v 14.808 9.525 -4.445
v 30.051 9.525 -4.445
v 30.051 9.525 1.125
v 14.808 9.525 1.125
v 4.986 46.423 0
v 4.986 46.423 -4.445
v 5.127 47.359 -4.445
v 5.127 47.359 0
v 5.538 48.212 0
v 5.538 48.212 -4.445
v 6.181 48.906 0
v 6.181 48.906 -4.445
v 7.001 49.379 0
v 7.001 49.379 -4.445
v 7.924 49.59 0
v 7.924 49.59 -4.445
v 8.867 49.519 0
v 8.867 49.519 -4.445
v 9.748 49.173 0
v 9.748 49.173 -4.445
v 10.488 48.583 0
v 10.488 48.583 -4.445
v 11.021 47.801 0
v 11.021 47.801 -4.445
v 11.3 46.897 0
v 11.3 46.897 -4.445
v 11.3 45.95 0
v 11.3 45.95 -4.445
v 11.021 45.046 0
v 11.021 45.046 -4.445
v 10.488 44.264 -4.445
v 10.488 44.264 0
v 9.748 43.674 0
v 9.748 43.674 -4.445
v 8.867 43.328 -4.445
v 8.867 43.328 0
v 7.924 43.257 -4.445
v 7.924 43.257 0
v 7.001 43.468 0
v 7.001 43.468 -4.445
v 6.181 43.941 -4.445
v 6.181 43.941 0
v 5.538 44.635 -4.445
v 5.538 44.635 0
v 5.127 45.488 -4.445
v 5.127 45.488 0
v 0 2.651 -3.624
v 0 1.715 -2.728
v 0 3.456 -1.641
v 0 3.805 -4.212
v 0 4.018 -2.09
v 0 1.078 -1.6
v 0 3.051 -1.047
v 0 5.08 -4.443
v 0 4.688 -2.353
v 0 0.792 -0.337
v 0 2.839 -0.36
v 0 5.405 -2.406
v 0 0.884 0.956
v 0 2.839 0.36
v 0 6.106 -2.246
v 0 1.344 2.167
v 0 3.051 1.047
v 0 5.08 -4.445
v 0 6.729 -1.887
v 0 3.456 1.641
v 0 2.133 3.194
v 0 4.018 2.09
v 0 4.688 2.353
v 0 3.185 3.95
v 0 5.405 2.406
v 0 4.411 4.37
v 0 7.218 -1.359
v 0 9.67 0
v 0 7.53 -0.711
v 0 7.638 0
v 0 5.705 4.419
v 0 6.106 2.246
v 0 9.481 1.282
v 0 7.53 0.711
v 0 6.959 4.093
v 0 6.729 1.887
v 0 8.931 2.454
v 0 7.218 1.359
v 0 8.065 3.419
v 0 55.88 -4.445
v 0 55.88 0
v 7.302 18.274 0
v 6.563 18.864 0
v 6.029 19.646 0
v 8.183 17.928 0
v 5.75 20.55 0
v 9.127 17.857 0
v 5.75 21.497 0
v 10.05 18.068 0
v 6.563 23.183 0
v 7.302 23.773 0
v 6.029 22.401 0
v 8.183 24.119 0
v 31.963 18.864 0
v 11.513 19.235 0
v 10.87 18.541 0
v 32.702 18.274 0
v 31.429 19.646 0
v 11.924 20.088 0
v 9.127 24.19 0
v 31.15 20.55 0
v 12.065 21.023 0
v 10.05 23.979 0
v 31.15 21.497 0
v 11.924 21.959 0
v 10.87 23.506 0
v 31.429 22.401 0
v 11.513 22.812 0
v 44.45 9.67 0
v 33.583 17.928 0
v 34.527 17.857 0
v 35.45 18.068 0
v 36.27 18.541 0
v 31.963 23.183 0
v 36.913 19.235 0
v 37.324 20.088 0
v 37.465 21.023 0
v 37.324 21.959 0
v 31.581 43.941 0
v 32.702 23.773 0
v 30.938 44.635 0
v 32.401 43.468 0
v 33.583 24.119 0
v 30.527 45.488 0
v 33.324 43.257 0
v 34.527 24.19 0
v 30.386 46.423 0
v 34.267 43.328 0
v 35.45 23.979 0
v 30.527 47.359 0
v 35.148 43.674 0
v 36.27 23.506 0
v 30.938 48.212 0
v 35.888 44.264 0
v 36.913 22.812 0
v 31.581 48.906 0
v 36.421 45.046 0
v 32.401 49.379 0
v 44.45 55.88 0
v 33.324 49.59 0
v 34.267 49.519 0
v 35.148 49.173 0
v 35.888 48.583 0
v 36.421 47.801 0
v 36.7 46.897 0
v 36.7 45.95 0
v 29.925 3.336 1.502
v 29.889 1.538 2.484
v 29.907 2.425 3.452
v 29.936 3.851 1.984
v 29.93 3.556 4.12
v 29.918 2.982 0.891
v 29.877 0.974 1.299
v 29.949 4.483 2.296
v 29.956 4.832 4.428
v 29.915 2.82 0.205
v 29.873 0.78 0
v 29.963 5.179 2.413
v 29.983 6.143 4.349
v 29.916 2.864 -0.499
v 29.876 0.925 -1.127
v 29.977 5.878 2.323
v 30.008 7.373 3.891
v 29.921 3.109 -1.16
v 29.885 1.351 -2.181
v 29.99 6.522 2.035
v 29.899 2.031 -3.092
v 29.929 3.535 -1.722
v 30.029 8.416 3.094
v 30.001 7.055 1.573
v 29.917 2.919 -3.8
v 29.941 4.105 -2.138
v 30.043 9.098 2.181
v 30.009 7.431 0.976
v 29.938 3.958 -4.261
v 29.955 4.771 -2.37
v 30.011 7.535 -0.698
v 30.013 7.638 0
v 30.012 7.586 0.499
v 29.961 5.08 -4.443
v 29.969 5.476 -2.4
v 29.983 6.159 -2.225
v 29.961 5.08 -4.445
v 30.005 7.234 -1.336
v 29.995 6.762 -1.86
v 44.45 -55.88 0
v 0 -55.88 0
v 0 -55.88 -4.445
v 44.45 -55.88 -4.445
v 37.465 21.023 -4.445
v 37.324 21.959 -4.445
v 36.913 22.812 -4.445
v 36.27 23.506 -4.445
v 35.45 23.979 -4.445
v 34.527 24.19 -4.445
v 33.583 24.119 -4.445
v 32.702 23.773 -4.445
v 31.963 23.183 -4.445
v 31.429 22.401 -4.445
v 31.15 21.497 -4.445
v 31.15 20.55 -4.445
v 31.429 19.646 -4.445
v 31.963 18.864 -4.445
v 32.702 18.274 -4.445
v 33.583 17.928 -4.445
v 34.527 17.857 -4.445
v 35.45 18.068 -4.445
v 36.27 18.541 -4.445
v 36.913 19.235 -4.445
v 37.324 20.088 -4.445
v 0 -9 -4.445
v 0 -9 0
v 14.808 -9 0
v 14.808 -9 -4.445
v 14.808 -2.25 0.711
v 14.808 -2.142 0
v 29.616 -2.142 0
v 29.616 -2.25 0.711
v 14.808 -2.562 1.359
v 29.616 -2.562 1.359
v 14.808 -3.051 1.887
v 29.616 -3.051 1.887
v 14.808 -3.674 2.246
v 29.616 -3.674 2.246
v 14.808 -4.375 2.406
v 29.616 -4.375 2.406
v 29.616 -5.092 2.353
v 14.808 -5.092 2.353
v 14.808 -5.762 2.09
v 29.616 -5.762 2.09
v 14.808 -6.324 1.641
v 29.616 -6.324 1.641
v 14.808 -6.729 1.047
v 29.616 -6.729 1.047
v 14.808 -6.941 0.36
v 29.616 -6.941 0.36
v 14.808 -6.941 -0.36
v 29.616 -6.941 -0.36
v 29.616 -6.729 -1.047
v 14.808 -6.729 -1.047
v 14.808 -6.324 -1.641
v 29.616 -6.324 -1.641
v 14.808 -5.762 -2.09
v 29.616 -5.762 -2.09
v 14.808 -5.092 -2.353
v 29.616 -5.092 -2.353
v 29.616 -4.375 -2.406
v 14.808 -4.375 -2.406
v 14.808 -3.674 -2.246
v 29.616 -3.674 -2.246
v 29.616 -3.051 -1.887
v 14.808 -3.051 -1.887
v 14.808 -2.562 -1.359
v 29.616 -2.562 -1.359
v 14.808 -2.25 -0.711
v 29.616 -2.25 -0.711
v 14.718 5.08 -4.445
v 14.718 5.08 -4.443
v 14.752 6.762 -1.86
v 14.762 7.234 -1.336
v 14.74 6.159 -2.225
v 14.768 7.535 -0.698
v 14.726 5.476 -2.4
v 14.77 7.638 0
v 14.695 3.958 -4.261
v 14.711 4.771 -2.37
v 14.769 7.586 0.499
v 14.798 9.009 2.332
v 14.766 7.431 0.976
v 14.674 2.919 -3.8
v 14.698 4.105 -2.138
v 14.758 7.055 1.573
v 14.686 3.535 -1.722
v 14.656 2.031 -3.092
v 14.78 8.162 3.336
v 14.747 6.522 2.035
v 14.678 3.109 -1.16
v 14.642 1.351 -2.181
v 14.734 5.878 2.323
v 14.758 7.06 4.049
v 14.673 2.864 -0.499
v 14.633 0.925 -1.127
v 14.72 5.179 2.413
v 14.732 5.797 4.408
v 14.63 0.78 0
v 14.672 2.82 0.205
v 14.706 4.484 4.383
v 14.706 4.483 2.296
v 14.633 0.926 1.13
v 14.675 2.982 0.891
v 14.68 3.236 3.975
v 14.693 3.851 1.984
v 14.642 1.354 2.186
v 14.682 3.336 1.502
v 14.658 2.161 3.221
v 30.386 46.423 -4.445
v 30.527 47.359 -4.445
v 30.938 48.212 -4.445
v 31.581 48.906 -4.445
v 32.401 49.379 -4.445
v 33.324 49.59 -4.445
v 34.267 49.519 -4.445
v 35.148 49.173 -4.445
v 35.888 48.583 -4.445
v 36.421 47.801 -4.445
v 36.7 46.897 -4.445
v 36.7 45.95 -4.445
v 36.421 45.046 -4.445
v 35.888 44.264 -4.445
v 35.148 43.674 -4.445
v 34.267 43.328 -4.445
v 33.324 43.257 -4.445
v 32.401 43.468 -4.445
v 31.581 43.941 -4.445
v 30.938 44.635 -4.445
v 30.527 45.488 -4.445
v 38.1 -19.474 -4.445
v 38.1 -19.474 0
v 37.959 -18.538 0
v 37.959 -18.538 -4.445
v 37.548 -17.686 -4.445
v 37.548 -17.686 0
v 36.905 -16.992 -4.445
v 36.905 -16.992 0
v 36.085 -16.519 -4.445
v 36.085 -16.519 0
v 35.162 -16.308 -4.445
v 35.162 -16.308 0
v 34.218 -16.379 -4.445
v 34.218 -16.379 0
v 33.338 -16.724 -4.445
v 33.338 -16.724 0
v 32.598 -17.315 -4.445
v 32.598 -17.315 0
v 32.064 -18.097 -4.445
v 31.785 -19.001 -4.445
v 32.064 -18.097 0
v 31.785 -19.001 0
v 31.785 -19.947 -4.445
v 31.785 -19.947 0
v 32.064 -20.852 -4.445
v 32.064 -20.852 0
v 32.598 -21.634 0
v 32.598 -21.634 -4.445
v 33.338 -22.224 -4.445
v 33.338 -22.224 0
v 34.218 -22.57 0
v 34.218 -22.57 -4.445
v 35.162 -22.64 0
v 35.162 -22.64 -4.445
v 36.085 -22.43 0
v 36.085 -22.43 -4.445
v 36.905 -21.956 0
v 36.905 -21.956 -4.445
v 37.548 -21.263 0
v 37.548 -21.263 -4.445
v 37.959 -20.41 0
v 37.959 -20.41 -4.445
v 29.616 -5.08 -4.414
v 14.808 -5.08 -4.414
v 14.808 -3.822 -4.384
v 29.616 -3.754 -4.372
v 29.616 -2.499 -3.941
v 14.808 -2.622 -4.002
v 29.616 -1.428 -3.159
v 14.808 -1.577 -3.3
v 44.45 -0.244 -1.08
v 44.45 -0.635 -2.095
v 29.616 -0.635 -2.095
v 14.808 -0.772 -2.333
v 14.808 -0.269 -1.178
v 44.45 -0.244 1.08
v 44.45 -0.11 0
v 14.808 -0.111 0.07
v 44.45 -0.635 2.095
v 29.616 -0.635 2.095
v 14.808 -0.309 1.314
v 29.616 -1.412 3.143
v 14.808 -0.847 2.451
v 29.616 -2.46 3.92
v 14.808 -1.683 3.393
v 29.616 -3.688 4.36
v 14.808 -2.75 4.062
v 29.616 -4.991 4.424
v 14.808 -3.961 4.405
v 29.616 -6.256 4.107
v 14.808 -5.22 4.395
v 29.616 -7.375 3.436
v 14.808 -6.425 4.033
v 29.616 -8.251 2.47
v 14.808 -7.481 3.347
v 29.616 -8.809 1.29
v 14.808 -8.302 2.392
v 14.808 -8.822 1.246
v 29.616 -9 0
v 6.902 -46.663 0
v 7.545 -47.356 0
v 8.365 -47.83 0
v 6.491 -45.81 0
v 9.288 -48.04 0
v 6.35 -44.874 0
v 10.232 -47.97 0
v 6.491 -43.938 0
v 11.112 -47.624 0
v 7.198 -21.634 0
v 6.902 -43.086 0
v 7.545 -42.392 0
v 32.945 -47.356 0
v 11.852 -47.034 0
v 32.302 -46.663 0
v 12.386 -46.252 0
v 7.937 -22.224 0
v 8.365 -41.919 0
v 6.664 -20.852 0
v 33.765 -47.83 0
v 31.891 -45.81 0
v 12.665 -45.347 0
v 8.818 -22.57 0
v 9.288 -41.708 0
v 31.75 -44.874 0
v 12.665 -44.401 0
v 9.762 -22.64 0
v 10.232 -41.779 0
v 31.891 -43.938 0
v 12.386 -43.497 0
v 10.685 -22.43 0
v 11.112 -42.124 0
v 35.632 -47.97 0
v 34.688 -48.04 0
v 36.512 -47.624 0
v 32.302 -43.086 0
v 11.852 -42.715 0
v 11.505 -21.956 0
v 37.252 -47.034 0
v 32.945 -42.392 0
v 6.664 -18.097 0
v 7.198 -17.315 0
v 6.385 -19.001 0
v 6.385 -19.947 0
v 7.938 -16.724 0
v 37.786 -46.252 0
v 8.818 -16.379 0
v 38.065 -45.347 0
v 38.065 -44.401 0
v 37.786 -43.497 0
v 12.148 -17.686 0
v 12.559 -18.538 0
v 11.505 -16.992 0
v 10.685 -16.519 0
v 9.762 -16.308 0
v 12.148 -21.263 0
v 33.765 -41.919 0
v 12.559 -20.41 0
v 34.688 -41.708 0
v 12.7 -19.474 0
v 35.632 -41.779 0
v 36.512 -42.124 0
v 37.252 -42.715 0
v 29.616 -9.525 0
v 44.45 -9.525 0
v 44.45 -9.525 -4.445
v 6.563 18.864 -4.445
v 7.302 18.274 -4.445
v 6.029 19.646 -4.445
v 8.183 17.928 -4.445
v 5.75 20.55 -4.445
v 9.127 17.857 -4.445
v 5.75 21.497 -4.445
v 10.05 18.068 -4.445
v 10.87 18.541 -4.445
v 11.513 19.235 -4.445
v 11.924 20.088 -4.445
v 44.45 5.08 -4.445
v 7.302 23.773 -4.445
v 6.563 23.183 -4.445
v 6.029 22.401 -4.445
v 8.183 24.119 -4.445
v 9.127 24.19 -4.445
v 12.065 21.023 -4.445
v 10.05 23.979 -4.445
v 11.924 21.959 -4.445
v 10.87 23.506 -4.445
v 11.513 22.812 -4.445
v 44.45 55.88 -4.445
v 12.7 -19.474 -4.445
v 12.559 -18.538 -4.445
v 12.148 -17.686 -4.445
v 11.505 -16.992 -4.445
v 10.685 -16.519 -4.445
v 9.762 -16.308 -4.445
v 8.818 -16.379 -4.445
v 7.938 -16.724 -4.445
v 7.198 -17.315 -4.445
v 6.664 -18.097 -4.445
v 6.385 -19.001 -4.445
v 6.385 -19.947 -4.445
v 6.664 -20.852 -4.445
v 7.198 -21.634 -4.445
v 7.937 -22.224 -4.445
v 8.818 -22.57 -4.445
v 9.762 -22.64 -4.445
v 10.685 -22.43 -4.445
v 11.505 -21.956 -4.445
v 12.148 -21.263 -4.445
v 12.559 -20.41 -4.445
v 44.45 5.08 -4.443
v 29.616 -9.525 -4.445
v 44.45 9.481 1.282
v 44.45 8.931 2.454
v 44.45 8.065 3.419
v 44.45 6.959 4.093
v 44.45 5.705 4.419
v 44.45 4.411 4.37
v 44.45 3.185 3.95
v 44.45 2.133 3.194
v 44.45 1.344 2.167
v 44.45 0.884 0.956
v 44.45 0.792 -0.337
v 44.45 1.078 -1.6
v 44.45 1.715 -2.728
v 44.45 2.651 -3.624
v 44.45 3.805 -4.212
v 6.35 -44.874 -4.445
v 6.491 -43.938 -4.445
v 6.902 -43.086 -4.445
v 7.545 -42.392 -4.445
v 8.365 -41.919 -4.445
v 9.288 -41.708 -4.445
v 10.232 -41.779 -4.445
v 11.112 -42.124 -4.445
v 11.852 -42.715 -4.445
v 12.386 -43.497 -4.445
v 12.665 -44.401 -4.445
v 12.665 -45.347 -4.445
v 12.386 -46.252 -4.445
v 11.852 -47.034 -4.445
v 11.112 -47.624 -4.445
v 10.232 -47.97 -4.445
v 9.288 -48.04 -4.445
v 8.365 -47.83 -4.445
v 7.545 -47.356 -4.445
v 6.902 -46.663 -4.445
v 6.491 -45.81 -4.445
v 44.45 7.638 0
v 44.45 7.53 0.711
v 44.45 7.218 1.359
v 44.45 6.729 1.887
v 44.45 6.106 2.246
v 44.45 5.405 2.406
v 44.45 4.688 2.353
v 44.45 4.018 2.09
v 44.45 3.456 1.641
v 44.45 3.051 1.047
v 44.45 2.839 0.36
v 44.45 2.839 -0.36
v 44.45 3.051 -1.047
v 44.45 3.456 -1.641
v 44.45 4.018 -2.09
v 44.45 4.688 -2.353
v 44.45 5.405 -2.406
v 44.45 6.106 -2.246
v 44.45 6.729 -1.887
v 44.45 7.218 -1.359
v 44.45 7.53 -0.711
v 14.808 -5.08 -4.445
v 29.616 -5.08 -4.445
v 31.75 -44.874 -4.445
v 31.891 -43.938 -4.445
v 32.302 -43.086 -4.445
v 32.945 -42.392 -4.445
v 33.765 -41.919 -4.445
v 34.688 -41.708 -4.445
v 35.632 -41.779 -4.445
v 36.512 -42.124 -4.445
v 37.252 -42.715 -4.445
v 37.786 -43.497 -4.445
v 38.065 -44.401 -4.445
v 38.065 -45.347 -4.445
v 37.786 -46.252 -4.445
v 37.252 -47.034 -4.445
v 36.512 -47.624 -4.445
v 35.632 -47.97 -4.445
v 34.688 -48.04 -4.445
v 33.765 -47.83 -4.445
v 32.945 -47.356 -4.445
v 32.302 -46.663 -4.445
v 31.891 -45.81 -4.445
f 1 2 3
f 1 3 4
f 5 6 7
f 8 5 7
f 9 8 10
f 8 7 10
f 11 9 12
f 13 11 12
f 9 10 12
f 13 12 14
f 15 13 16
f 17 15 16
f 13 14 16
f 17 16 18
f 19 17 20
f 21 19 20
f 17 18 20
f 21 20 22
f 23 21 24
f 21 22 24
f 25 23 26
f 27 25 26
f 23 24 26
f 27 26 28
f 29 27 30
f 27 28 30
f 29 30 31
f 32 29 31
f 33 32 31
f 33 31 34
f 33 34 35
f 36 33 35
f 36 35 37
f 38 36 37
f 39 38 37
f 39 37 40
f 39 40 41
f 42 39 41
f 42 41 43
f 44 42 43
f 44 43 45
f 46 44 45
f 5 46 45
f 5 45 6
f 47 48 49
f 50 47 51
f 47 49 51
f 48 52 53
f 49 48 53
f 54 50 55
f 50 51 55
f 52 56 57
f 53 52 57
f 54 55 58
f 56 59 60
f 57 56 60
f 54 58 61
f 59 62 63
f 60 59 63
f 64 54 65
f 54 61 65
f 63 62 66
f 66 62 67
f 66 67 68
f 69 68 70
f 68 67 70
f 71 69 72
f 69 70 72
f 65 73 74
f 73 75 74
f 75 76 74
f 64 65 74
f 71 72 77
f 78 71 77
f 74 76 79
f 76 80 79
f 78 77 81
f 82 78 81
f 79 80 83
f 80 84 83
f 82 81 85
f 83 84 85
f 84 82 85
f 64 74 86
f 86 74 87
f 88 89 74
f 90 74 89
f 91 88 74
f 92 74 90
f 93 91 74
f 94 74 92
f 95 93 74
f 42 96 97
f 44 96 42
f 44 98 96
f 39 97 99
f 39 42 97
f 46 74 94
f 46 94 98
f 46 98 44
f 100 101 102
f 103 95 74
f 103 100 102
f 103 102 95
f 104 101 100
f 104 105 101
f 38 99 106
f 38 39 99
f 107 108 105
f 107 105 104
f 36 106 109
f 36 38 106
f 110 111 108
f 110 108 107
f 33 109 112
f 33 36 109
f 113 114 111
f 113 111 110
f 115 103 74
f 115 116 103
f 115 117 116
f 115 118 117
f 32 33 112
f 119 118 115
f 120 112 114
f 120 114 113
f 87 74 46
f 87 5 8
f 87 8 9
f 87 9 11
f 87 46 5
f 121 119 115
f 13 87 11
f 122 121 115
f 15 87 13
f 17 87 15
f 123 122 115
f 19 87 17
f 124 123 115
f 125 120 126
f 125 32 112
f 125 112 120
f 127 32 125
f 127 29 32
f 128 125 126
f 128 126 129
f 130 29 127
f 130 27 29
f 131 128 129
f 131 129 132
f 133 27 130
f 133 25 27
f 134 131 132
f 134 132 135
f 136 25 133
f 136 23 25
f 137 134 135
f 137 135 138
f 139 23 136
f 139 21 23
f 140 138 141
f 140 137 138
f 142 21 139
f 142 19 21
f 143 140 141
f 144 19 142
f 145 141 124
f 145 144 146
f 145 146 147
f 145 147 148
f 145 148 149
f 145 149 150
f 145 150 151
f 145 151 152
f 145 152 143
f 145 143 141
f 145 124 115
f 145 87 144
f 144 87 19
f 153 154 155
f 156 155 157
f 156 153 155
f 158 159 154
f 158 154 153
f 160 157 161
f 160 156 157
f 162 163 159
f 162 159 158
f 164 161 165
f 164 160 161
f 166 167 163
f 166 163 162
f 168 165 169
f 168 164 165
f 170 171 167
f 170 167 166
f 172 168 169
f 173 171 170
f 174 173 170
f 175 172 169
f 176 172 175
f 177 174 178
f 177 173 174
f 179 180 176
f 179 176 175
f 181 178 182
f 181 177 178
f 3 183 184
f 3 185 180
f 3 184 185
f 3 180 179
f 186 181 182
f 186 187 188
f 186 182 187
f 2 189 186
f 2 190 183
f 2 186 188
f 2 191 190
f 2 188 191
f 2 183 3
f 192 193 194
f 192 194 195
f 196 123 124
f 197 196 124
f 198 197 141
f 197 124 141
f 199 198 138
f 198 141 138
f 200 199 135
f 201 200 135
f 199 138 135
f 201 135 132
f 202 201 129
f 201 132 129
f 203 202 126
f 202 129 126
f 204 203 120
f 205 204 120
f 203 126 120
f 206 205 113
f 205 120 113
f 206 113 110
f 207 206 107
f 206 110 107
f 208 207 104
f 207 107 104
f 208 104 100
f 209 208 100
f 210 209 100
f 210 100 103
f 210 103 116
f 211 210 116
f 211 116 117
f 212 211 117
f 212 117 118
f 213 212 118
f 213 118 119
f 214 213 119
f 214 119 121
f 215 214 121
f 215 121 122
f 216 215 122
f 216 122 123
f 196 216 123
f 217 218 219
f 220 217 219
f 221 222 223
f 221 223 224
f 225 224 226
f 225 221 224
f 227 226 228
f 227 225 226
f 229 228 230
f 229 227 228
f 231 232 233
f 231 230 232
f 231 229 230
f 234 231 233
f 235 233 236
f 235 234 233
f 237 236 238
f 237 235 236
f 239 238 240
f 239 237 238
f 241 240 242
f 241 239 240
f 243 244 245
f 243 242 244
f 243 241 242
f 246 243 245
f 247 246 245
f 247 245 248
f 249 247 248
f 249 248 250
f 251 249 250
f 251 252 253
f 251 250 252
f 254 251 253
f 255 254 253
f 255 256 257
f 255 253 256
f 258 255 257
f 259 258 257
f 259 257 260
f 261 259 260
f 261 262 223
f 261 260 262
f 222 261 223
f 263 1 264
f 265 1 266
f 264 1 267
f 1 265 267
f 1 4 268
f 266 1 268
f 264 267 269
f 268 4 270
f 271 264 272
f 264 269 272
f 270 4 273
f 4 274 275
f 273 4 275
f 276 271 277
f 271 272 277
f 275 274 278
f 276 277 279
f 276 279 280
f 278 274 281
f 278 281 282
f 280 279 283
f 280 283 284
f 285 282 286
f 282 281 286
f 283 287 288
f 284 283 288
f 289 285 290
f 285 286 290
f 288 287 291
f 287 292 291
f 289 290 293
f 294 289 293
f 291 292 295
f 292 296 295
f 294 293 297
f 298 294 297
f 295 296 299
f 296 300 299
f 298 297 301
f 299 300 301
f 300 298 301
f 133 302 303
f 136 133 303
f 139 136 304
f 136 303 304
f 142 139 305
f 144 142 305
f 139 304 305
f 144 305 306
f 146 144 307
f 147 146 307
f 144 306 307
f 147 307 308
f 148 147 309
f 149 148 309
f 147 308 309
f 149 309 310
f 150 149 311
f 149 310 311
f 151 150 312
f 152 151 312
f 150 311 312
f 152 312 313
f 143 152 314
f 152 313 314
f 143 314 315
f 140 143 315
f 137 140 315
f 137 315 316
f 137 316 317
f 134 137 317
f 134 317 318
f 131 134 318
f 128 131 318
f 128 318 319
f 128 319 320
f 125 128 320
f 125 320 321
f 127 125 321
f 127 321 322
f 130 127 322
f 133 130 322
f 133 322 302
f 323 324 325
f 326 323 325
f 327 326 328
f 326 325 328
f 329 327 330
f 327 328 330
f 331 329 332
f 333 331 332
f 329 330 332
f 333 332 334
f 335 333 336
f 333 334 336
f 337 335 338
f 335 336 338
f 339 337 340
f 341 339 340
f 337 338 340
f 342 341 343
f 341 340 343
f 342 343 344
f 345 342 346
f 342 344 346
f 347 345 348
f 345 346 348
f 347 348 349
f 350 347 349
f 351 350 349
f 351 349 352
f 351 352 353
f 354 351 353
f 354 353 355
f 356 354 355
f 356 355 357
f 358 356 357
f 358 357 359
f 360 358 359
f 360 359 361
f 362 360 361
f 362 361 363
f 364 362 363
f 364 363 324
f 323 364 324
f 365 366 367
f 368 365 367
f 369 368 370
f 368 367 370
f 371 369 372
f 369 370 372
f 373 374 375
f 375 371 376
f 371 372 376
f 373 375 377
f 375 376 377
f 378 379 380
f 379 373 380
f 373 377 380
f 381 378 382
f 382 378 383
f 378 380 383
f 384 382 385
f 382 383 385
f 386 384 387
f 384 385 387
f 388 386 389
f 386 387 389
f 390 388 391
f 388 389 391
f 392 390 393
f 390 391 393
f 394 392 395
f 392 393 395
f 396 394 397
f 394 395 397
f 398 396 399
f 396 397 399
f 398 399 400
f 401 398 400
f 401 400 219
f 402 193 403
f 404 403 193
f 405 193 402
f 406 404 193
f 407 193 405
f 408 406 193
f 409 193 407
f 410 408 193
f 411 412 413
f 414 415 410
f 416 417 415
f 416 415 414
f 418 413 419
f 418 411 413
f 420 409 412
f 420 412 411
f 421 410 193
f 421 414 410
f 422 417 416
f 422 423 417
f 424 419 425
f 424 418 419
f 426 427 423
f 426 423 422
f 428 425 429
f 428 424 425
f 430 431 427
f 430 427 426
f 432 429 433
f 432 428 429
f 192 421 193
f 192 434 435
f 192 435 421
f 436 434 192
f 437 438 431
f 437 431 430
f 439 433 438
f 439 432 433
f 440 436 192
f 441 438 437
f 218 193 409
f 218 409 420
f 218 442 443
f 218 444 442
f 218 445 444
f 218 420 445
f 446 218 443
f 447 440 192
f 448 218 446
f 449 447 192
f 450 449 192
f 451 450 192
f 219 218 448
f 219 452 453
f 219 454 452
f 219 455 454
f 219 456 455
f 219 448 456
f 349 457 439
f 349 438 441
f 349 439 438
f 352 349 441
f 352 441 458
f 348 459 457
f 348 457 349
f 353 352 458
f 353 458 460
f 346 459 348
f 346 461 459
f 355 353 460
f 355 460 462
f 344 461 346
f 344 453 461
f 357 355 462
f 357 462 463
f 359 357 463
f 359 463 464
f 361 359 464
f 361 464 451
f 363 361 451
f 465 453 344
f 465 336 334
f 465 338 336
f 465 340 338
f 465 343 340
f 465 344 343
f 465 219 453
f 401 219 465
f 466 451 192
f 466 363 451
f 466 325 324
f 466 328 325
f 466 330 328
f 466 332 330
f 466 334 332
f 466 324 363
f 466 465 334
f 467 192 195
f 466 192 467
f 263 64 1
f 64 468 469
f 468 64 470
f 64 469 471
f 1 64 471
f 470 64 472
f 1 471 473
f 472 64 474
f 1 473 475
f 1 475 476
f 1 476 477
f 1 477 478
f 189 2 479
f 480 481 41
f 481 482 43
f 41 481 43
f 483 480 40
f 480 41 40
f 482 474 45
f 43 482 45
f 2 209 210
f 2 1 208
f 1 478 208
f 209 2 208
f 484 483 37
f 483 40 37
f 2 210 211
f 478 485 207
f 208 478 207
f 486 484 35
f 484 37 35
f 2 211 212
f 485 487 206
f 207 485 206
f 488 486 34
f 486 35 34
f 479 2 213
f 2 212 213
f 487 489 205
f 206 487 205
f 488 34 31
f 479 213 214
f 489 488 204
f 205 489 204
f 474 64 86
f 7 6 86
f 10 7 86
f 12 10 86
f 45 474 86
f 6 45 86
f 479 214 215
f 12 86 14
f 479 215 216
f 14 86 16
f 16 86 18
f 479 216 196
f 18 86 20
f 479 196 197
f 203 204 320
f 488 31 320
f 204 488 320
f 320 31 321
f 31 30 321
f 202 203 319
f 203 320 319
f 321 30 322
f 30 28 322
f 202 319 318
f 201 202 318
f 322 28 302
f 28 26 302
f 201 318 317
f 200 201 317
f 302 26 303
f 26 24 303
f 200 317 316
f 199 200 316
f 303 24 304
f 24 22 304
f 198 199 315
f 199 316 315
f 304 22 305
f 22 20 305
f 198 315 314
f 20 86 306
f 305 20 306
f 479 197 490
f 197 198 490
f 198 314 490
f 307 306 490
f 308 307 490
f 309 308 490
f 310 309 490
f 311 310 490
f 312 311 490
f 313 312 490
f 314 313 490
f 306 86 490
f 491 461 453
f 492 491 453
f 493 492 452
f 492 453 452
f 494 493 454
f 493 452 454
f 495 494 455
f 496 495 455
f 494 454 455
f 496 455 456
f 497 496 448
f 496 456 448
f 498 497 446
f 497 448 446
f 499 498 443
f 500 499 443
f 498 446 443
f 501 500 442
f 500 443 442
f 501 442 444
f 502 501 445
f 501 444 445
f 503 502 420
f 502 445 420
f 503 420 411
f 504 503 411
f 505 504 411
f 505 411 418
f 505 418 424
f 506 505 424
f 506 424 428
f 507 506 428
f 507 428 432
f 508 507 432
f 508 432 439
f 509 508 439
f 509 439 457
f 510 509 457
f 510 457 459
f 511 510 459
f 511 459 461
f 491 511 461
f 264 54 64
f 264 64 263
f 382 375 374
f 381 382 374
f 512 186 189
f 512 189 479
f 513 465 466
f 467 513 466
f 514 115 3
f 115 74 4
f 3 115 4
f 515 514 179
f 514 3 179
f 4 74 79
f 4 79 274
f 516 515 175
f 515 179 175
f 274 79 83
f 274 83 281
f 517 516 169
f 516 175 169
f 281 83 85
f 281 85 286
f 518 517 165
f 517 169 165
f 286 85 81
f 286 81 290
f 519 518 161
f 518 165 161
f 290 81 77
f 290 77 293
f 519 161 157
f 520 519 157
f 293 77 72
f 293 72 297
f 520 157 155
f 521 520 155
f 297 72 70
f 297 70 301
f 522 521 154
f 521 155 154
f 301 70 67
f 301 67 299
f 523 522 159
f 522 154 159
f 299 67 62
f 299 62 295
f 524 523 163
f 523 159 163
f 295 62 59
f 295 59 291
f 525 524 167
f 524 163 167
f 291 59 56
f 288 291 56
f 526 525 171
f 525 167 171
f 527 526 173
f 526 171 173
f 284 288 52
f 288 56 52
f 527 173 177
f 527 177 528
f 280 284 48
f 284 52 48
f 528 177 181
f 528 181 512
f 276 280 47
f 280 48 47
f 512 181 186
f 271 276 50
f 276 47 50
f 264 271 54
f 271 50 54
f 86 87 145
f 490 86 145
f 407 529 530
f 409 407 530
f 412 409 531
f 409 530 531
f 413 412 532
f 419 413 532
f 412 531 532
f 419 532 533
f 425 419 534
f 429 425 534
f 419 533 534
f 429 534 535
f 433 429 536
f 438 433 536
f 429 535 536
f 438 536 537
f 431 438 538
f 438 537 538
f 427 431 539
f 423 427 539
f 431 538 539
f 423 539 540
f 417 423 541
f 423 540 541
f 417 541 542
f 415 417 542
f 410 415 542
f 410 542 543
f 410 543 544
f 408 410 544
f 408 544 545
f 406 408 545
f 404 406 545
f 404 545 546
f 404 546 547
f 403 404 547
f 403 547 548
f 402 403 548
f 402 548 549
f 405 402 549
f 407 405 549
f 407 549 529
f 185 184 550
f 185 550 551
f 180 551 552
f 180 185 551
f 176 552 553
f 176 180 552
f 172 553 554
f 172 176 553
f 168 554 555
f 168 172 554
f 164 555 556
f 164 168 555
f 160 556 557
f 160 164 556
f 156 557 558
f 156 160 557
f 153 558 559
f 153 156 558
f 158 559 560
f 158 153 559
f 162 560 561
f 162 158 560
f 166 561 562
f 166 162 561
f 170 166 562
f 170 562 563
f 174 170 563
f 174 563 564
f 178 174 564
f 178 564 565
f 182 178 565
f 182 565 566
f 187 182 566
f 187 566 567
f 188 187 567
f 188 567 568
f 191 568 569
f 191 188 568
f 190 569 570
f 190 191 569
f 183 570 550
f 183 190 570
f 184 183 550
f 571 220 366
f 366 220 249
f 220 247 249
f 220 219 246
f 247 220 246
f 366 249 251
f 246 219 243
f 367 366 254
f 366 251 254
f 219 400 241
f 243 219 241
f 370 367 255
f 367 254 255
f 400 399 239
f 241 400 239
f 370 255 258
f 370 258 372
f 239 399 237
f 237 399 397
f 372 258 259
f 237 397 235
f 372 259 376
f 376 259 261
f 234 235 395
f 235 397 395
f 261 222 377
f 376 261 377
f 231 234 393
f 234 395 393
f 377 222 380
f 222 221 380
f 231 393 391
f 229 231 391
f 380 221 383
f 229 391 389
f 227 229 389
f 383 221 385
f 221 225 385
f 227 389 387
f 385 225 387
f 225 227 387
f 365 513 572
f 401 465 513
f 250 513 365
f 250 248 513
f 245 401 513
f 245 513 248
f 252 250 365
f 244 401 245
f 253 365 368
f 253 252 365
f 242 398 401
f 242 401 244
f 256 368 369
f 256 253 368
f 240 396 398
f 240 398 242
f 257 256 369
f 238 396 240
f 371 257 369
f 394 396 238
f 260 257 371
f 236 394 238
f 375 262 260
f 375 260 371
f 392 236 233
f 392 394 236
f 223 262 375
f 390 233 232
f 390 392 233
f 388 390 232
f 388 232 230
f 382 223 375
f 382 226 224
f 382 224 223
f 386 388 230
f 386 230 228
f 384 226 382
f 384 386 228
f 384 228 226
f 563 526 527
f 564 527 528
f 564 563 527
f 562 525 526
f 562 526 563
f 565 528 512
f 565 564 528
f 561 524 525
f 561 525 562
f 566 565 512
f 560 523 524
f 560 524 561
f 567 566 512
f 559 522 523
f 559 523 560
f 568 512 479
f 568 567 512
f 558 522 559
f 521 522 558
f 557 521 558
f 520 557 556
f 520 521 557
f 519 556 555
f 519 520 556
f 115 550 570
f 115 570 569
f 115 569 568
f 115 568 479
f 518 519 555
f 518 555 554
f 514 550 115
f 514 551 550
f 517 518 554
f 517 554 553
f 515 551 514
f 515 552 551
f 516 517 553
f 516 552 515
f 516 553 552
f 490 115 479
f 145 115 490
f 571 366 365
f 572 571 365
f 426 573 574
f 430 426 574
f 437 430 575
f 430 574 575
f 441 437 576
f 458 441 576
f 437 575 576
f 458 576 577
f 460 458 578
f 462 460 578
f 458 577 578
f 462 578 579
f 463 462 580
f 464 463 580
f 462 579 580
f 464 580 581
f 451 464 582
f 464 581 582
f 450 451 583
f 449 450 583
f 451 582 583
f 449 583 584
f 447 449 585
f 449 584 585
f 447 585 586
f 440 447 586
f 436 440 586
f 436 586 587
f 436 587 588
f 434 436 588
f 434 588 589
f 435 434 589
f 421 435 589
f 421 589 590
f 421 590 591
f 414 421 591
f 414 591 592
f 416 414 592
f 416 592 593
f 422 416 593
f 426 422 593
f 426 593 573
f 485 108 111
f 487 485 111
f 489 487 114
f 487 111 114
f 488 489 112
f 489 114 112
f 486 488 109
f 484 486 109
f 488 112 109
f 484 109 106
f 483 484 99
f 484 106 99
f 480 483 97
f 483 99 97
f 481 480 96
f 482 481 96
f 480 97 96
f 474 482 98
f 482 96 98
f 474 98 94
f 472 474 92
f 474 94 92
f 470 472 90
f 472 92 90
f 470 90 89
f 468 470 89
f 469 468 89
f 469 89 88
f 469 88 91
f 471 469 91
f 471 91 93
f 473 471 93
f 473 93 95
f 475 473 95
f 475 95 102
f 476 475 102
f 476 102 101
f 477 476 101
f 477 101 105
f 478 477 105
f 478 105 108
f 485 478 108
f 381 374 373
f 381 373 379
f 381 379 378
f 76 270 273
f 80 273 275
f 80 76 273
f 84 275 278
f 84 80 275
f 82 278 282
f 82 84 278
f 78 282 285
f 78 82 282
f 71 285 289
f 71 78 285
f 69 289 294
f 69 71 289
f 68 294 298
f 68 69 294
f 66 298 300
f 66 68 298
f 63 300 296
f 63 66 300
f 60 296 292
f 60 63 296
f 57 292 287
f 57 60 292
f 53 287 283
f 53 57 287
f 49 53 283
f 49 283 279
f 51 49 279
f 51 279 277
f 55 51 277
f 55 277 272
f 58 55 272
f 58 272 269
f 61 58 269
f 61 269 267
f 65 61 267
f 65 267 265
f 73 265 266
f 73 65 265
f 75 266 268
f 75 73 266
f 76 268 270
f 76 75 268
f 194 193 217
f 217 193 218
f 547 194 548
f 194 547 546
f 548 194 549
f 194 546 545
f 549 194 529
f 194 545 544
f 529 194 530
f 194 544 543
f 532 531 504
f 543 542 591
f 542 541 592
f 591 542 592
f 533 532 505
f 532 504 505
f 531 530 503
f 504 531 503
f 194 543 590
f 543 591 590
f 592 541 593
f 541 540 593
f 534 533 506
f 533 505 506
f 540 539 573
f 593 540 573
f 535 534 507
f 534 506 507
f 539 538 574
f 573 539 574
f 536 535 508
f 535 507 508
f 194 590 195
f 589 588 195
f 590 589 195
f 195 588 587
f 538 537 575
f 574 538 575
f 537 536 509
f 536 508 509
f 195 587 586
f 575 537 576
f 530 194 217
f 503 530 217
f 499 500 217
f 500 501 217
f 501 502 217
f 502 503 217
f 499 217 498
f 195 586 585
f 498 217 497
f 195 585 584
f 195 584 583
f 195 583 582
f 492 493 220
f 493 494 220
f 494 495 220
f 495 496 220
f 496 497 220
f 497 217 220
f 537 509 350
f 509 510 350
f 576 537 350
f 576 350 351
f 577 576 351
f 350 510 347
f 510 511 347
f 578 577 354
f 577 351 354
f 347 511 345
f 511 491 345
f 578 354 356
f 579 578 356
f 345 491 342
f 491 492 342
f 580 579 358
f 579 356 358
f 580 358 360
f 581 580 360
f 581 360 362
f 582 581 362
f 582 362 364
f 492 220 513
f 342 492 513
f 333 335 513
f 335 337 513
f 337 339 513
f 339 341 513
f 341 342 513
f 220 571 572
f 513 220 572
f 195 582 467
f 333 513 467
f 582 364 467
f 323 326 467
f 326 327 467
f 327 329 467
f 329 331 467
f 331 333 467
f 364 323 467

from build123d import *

# Parameters (mm, degrees)
F0_W           = 44.45
F0_H           = 50.8
F2_DEPTH       = 4.445
F3_DEPTH       = 4.445
F1_R           = 4.445
F4_DEPTH       = 44.45
F6_W           = 14.8082
F6_H           = 8.89
F6_W_2         = 14.859
F7_DEPTH       = 5.08
F7_DEPTH_BACK  = 5.08
F8_DEPTH       = 5.08
F8_DEPTH_BACK  = 5.08
F9_R           = 2.413
F10_DEPTH      = 44.451
F11_R          = 2.413
F12_DEPTH      = 44.451
F13_R          = 3.175
F14_DEPTH      = 4.446
F14_DEPTH_BACK = 4.446
F15_R          = 3.175
F16_DEPTH      = 4.446
F19_D          = 6.35
F20_D          = 6.35


# Not quite as in the source:
# - a feature of the source that left no trace in its solid (it failed there, or was rolled back) is left out


with BuildPart() as f2:
    # F0 (on Top) → F2 (new body)
    with BuildSketch(Plane.XY):
        with Locations((22.225, 30.48)):
            Rectangle(F0_W, F0_H)
    extrude(amount=-F2_DEPTH)

    # F1 (on Right) → F4 (join)
    with BuildSketch(Plane.YZ):
        with Locations((5.2246893756, 0)):
            Circle(F1_R)
    extrude(amount=F4_DEPTH)


with BuildPart() as f3:
    # F0 (on Top) → F3 (new body)
    with BuildSketch(Plane.XY):
        with Locations((22.225, -30.48)):
            Rectangle(F0_W, F0_H)
    extrude(amount=-F3_DEPTH)

    # F1 (on Right) → F4, piece 2 (join)
    with BuildSketch(Plane.YZ):
        with Locations((-4.5553469099, 0)):
            Circle(F1_R)
    extrude(amount=F4_DEPTH)


with BuildPart() as f2_1:
    add(f2.part)

    # F5: union F3
    add(f3.part)

    # F6 (on Top) → F7 (cut, two sides)
    with BuildSketch(Plane.XY) as f7_sk:
        with Locations((7.4041, -4.5553469099)):
            Rectangle(F6_W, F6_H)
        with Locations((37.0459, -5.08)):
            Rectangle(F6_W_2, F6_H)
    extrude(amount=-F7_DEPTH, mode=Mode.SUBTRACT)
    extrude(f7_sk.sketch, amount=F7_DEPTH_BACK, mode=Mode.SUBTRACT)

    # F6 (on Top) → F8 (cut, two sides)
    with BuildSketch(Plane.XY) as f8_sk:
        Polygon((30.0513568694, 9.525), (14.8082, 9.525), (14.6272431306, 0.635), (29.8704, 0.635), align=None)
    extrude(amount=-F8_DEPTH, mode=Mode.SUBTRACT)
    extrude(f8_sk.sketch, amount=F8_DEPTH_BACK, mode=Mode.SUBTRACT)

    # F9 (on face) → F10 (cut, through all)
    with BuildSketch(Plane.YZ):
        with Locations((-4.5553469099, 0)):
            Circle(F9_R)
    extrude(amount=F10_DEPTH, mode=Mode.SUBTRACT)

    # F11 (on face) → F12 (cut, through all)
    with BuildSketch(Plane.YZ):
        with Locations((5.2246893756, 0)):
            Circle(F11_R)
    extrude(amount=F12_DEPTH, mode=Mode.SUBTRACT)

    # F13 (on face) → F14 (cut, two sides)
    with BuildSketch(Plane.XY) as f14_sk:
        with Locations((8.89, 21.0234560072)):
            Circle(F13_R)
        with Locations((34.29, 21.0234560072)):
            Circle(F13_R)
    extrude(amount=-F14_DEPTH, mode=Mode.SUBTRACT)
    extrude(f14_sk.sketch, amount=F14_DEPTH_BACK, mode=Mode.SUBTRACT)

    # F15 (on face) → F16 (cut, through all)
    with BuildSketch(Plane.XY):
        with Locations((34.925, -19.4741119201)):
            Circle(F15_R)
        with Locations((9.525, -19.4741119201)):
            Circle(F15_R)
    extrude(amount=-F16_DEPTH, mode=Mode.SUBTRACT)

    # F19 (through all)
    with Locations(Plane.XY):
        with Locations((9.525, -44.8741119201), (34.925, -44.8741119201)):
            Hole(F19_D / 2)

    # F20 (through all)
    with Locations(Plane.XY):
        with Locations((8.1608192995, 46.4234560072), (33.5608192995, 46.4234560072)):
            Hole(F20_D / 2)


solid = f2_1.part
